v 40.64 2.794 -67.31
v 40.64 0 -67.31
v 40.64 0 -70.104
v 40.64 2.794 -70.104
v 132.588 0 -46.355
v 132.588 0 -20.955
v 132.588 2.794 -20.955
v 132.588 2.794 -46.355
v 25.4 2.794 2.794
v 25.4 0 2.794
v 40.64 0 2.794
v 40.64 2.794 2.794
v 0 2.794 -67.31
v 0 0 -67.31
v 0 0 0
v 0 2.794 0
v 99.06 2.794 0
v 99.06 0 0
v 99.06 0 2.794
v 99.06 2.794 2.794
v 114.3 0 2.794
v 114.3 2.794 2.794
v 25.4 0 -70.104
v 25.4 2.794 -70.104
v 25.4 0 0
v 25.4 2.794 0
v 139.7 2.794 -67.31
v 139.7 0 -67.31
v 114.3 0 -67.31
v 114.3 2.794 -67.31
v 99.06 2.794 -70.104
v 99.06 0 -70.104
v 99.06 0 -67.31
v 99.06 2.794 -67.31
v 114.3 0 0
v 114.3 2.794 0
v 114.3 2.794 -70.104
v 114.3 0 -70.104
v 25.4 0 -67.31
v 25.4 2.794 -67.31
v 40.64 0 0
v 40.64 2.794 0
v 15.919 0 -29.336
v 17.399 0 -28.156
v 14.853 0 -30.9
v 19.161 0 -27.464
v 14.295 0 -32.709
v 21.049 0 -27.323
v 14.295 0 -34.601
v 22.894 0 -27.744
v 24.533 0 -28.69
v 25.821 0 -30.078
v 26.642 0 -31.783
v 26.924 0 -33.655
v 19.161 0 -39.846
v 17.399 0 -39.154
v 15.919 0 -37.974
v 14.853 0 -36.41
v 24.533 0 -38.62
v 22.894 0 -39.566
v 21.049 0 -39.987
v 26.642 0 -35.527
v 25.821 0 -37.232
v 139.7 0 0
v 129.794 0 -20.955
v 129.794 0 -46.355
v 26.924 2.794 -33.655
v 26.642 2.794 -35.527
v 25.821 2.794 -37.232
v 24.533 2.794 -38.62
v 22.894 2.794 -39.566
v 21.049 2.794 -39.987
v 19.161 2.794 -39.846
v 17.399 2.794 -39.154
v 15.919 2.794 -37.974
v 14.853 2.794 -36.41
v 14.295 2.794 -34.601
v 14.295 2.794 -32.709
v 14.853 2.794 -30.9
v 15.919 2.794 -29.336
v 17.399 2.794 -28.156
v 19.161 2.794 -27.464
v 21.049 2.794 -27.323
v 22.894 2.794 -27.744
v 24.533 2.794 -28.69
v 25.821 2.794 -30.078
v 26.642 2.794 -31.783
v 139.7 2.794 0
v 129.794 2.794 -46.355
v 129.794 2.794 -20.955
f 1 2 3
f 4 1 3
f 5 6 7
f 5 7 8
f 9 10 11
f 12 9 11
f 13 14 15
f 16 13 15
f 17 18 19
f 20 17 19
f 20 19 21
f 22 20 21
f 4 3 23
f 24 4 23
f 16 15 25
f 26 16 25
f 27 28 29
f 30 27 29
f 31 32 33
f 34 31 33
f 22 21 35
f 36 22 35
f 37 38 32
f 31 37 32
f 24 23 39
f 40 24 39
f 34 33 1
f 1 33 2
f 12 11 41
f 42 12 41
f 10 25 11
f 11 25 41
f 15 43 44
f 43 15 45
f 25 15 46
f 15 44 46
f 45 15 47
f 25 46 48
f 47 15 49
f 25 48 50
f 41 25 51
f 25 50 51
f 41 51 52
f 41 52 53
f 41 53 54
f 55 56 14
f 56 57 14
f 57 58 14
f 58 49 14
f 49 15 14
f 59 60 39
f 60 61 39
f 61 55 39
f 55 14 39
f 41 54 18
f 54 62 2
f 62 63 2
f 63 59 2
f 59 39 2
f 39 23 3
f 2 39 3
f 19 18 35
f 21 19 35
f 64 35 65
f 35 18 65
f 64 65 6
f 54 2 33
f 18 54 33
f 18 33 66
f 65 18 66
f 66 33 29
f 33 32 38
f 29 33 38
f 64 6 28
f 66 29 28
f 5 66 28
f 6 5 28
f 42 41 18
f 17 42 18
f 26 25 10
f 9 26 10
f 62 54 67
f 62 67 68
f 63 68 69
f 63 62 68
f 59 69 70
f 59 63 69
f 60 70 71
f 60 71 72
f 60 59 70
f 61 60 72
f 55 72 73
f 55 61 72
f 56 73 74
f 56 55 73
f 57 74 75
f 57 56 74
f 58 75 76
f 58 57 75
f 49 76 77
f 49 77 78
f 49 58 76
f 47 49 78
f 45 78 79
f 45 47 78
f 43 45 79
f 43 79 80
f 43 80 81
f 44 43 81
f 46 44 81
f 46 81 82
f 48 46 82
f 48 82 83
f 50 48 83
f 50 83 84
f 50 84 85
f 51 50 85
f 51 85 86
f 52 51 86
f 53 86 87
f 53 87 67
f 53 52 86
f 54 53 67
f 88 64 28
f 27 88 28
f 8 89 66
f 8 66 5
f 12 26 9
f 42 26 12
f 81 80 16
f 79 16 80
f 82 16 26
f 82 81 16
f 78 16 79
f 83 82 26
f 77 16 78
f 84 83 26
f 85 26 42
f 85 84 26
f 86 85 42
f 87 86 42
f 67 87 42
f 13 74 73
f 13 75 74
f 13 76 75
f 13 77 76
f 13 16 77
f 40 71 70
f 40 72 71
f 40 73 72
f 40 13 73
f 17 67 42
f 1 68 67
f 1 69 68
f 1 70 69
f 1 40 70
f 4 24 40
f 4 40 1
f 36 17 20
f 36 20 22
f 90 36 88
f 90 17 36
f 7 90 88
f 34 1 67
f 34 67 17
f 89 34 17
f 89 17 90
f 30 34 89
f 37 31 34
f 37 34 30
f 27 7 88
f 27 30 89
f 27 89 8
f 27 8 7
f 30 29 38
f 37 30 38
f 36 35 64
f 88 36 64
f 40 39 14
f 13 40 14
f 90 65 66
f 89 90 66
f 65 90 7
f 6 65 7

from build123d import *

# Parameters (mm, degrees)
SKETCH2_R           = 6.35
SKETCH2_W           = 2.794
SKETCH2_H           = 25.4
BOSS_EXTRUDE1_DEPTH = 2.794


with BuildPart() as part:
    # Sketch2 → Boss-Extrude1 (new body)
    with BuildSketch(Plane(origin=(0, 0, 0), x_dir=(1, 0, 0), z_dir=(0, 1, 0))):
        Polygon((0, 0), (25.4, 0), (25.4, -2.794), (40.64, -2.794), (40.64, 0), (99.06, 0), (99.06, -2.794), (114.3, -2.794), (114.3, 0), (139.7, 0), (139.7, 67.31), (114.3, 67.31), (114.3, 70.104), (99.06, 70.104), (99.06, 67.31), (40.64, 67.31), (40.64, 70.104), (25.4, 70.104), (25.4, 67.31), (0, 67.31), align=None)
        with Locations((20.574, 33.655)):
            Circle(SKETCH2_R, mode=Mode.SUBTRACT)
        with Locations((131.191, 33.655)):
            Rectangle(SKETCH2_W, SKETCH2_H, mode=Mode.SUBTRACT)
    extrude(amount=BOSS_EXTRUDE1_DEPTH)


solid = part.part
